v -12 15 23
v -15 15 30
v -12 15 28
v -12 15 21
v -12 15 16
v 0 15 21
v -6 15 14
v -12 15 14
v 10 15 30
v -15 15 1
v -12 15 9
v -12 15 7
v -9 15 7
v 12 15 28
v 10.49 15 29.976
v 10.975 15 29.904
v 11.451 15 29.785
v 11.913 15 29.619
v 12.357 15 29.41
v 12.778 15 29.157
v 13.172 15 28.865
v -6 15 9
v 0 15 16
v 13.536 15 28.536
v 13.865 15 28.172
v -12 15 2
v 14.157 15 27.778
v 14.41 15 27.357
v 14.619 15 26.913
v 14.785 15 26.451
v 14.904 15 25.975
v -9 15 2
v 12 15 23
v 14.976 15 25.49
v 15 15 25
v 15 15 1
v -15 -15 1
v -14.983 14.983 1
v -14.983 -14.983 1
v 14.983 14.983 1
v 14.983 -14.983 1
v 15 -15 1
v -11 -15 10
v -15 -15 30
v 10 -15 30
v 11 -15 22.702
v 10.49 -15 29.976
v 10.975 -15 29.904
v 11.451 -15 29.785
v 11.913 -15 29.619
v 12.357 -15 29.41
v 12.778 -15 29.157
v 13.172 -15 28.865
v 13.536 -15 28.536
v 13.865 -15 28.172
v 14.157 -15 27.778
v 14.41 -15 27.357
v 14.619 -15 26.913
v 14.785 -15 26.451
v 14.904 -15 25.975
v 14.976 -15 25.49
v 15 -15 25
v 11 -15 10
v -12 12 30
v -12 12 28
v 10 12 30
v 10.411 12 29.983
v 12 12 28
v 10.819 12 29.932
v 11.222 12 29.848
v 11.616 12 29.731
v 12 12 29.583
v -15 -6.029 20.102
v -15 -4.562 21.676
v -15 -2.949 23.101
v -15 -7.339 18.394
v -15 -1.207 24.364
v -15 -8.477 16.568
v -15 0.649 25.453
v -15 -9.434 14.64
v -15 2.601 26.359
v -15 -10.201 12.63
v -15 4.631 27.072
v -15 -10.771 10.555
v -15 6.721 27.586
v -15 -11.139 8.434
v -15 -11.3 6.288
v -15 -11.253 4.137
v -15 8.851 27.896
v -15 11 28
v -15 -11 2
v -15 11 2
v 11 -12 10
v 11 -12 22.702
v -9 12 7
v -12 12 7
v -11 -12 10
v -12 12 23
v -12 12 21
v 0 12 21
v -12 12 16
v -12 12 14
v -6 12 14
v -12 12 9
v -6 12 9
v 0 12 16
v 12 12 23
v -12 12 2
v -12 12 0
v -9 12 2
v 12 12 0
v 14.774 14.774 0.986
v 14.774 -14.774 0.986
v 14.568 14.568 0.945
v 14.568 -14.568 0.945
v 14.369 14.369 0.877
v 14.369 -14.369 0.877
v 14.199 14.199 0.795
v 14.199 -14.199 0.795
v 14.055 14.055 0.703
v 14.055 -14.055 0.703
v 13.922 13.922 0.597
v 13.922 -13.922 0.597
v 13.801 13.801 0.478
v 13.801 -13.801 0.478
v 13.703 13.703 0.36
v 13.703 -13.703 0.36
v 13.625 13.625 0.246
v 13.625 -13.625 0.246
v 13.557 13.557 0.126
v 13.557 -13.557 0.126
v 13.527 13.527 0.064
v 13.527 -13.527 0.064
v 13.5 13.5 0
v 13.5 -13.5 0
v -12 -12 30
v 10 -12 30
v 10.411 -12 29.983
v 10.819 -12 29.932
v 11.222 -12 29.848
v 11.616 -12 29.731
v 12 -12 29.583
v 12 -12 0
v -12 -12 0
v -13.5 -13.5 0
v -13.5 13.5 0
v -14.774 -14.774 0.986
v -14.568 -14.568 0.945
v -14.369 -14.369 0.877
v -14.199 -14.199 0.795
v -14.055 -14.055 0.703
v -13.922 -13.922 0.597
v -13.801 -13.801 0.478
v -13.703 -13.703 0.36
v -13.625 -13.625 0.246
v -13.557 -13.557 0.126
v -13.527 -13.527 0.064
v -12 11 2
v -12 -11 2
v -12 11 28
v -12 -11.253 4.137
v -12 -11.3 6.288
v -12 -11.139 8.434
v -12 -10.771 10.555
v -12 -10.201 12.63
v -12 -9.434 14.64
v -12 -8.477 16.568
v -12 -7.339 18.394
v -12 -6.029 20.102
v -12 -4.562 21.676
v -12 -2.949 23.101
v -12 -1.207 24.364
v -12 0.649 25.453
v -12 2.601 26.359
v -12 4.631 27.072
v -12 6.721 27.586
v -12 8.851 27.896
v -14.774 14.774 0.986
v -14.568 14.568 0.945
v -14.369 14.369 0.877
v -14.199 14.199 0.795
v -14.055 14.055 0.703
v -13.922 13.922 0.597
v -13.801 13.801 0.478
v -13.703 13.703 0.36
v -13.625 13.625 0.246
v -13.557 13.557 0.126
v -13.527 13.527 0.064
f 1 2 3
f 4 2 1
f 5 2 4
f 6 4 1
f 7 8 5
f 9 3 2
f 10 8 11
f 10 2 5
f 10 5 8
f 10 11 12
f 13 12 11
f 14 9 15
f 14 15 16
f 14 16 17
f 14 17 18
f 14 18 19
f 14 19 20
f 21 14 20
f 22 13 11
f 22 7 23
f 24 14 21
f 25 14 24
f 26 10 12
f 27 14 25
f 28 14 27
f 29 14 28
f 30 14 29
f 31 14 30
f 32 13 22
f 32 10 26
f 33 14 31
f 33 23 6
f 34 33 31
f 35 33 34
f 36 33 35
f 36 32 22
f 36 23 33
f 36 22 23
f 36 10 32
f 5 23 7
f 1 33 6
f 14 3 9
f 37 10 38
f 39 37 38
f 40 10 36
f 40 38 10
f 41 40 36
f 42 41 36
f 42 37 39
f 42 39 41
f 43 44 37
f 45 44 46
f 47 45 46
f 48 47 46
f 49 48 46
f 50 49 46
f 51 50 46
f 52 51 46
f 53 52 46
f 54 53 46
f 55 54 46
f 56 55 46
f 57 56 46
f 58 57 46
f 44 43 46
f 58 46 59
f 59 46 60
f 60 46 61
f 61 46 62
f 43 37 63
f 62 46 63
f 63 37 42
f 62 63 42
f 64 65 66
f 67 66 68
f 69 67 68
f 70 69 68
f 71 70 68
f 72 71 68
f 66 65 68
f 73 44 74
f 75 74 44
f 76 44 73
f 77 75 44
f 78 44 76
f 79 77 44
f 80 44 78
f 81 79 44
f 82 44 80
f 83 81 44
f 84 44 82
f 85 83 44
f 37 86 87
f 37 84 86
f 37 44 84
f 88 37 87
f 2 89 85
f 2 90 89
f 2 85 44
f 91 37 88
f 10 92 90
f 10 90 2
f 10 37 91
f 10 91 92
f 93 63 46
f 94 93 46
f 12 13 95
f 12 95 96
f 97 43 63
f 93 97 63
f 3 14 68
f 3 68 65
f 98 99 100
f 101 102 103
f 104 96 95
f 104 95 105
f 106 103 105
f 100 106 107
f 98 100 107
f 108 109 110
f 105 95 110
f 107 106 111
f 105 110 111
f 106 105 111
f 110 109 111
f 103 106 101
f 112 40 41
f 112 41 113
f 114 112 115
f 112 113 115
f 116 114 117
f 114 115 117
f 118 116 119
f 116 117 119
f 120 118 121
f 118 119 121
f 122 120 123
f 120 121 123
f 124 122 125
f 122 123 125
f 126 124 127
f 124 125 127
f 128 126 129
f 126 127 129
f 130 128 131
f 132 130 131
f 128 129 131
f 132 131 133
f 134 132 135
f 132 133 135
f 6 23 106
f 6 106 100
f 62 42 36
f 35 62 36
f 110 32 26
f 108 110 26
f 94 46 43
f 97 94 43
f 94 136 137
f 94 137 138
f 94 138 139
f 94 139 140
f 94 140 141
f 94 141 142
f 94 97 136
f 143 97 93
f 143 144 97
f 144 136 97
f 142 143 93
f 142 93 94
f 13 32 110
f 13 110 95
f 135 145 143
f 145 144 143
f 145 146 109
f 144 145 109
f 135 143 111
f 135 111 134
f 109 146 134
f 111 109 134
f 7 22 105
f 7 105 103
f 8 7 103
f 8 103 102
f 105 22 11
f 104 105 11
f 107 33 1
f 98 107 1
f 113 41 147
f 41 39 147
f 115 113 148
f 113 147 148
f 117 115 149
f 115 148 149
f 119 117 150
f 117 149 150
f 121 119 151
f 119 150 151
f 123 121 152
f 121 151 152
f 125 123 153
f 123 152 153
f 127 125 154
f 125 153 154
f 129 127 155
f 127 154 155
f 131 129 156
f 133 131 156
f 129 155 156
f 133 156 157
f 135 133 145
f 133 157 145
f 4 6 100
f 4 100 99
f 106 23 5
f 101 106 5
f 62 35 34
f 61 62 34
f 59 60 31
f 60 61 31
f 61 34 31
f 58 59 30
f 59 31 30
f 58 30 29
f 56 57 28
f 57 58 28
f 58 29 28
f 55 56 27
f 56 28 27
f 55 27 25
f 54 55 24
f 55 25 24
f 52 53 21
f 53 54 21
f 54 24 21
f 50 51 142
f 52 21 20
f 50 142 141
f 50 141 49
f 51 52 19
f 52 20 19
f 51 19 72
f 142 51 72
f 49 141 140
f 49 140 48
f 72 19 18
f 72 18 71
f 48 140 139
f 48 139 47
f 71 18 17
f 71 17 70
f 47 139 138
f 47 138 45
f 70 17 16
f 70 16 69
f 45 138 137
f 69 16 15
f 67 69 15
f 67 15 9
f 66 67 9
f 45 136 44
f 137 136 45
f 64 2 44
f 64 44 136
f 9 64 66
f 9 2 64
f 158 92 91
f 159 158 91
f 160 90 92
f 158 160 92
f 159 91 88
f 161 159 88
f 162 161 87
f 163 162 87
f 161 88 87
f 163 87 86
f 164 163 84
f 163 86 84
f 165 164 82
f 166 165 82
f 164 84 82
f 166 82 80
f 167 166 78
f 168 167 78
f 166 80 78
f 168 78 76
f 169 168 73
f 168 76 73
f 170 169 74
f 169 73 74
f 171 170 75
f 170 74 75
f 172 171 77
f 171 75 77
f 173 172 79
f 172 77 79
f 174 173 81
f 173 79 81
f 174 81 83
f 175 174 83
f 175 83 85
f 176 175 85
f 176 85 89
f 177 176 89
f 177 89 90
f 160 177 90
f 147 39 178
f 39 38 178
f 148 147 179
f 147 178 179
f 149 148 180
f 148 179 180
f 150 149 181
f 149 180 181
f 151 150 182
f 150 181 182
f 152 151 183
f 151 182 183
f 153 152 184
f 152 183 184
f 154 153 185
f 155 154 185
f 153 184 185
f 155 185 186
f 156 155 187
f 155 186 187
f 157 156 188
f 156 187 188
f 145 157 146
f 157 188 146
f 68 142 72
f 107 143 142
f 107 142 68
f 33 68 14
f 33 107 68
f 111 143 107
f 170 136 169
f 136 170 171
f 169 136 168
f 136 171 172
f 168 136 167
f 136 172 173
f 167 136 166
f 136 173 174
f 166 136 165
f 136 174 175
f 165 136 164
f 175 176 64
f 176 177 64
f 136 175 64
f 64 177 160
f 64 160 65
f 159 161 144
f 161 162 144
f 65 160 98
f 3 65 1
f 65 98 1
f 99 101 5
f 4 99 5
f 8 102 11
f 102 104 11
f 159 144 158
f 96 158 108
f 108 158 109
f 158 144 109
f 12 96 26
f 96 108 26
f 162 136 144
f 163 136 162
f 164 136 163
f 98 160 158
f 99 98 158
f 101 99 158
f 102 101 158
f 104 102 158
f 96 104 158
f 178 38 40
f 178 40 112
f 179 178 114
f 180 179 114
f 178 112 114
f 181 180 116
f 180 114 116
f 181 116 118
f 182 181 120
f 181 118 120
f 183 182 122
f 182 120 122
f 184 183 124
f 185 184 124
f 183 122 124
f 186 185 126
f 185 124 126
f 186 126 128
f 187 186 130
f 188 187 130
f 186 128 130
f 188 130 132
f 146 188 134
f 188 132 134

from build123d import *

# Parameters (mm, degrees)
F0_W          = 30
F0_H          = 30
F0_W_2        = 24
F0_H_2        = 24
F1_DEPTH      = 30
F3_DEPTH      = 5
F5_DEPTH      = 4
F6_W          = 12
F6_H          = 5
F6_W_2        = 6
F6_W_3        = 3
F6_W_4        = 24
F7_DEPTH      = 3
F8_W          = 30.8
F8_H          = 30.8
F8_W_2        = 27
F8_H_2        = 27
F9_DEPTH      = 1
F10_T1_DEPTH  = 27
F10_T3_DEPTH  = 27
F10_T9_DEPTH  = 30.7080992435
F10_T14_DEPTH = 30.7080992435
F10_T22_DEPTH = 30.7080992435
F10_T27_DEPTH = 30.7080992435
F10_T35_DEPTH = 30.7080992435
F10_T40_DEPTH = 30.7080992435
F10_T48_DEPTH = 30.7080992435
F10_T53_DEPTH = 30.7080992435
F11_T1_DEPTH  = 55


# Not quite as in the source:
# - a fillet or chamfer that OpenCascade refuses, or shapes differently, is made with other operations: its cross-section is extruded or revolved along the edge and cut away or added


with BuildPart() as f1:
    # F0 (on Top) → F1 (new body)
    with BuildSketch(Plane.XY):
        Rectangle(F0_W, F0_H)
        Rectangle(F0_W_2, F0_H_2, mode=Mode.SUBTRACT)
    extrude(amount=F1_DEPTH)

    # F2 (on face) → F3 (cut)
    with BuildSketch(Plane.XZ.offset(15)):
        Polygon((11, 22.7017059222), (-11, 10), (11, 10), align=None)
    extrude(amount=-F3_DEPTH, mode=Mode.SUBTRACT)

    # F4 (on face) → F5 (cut)
    with BuildSketch(Plane(origin=(-15, 0, 0), x_dir=(0, -1, 0), z_dir=(-1, 0, 0))):
        with BuildLine():
            ThreePointArc((11, 2), (6.0293863659, 20.1017884635), (-11, 28))
            Line((-11, 28), (-11, 2))
            Line((-11, 2), (11, 2))
        make_face()
    extrude(amount=-F5_DEPTH, mode=Mode.SUBTRACT)

    # F6 (on face) → F7 (cut)
    with BuildSketch(Plane(origin=(0, 15, 0), x_dir=(-1, 0, 0), z_dir=(0, 1, 0))):
        with Locations((6, 18.5)):
            Rectangle(F6_W, F6_H)
        with Locations((9, 11.5)):
            Rectangle(F6_W_2, F6_H)
        with Locations((10.5, 4.5)):
            Rectangle(F6_W_3, F6_H)
        with Locations((0, 25.5)):
            Rectangle(F6_W_4, F6_H)
    extrude(amount=-F7_DEPTH, mode=Mode.SUBTRACT)

    # F8 (on face) → F9 (cut)
    with BuildSketch(Plane(origin=(0, 0, 0), x_dir=(1, 0, 0), z_dir=(0, 0, -1))):
        Rectangle(F8_W, F8_H)
        Rectangle(F8_W_2, F8_H_2, mode=Mode.SUBTRACT)
    extrude(amount=-F9_DEPTH, mode=Mode.SUBTRACT)

    # F10: fillet of radius 1.6 on 4 edges, made by hand

    # F10_s2 → F10_t1 (join)
    with BuildSketch(Plane.XZ.offset(-13.5)):
        with BuildLine():
            ThreePointArc((-14.9832396974, 1), (-14.0888125064, 0.7266499161), (-13.5, 0))
            Line((-13.5, 0), (-13.5, 1))
            Line((-13.5, 1), (-14.9832396974, 1))
        make_face()
        with BuildLine():
            ThreePointArc((14.9832396974, 1), (14.0888125064, 0.7266499161), (13.5, 0))
            Line((13.5, 0), (13.5, 1))
            Line((13.5, 1), (14.9832396974, 1))
        make_face()
    extrude(amount=F10_T1_DEPTH)

    # F10_s4 → F10_t3 (join)
    with BuildSketch(Plane.YZ.offset(-13.5)):
        with BuildLine():
            ThreePointArc((14.9832396974, 1), (14.0888125064, 0.7266499161), (13.5, 0))
            Line((13.5, 0), (13.5, 1))
            Line((13.5, 1), (14.9832396974, 1))
        make_face()
        with BuildLine():
            ThreePointArc((-14.9832396974, 1), (-14.0888125064, 0.7266499161), (-13.5, 0))
            Line((-13.5, 0), (-13.5, 1))
            Line((-13.5, 1), (-14.9832396974, 1))
        make_face()
    extrude(amount=F10_T3_DEPTH)


with BuildPart() as f10_tool7:
    # F10_s8 → F10_t9 (new body)
    with BuildSketch(Plane.XZ.offset(-17.2080992435)):
        with BuildLine():
            ThreePointArc((-14.9832396974, 1), (-14.0888125064, 0.7266499161), (-13.5, 0))
            Line((-13.5, 0), (-13.5, 1))
            Line((-13.5, 1), (-14.9832396974, 1))
        make_face()
    extrude(amount=F10_T9_DEPTH)

    split(bisect_by=Plane.XZ.offset(-15), keep=Keep.TOP)

    split(bisect_by=Plane.XZ.offset(-13.5), keep=Keep.BOTTOM)


with BuildPart() as f10_tool12:
    # F10_s13 → F10_t14 (new body)
    with BuildSketch(Plane.YZ.offset(13.5)):
        with BuildLine():
            ThreePointArc((14.9832396974, 1), (14.0888125064, 0.7266499161), (13.5, 0))
            Line((13.5, 0), (13.5, 1))
            Line((13.5, 1), (14.9832396974, 1))
        make_face()
    extrude(amount=-F10_T14_DEPTH)

    split(bisect_by=Plane.YZ.offset(-15), keep=Keep.TOP)

    split(bisect_by=Plane.YZ.offset(-13.5), keep=Keep.BOTTOM)


with BuildPart() as f10_tool7_1:
    add(f10_tool7.part)

    # F10_t17: intersect F10_tool12
    add(f10_tool12.part, mode=Mode.INTERSECT)


with BuildPart() as f1_1:
    add(f1.part)

    # F10_t5: union F10_tool7
    add(f10_tool7_1.part)


with BuildPart() as f10_tool20:
    # F10_s21 → F10_t22 (new body)
    with BuildSketch(Plane.XZ.offset(-13.5)):
        with BuildLine():
            ThreePointArc((-14.9832396974, 1), (-14.0888125064, 0.7266499161), (-13.5, 0))
            Line((-13.5, 0), (-13.5, 1))
            Line((-13.5, 1), (-14.9832396974, 1))
        make_face()
    extrude(amount=F10_T22_DEPTH)

    split(bisect_by=Plane.XZ.offset(15), keep=Keep.BOTTOM)

    split(bisect_by=Plane.XZ.offset(13.5), keep=Keep.TOP)


with BuildPart() as f10_tool25:
    # F10_s26 → F10_t27 (new body)
    with BuildSketch(Plane.YZ.offset(-17.2080992435)):
        with BuildLine():
            ThreePointArc((-14.9832396974, 1), (-14.0888125064, 0.7266499161), (-13.5, 0))
            Line((-13.5, 0), (-13.5, 1))
            Line((-13.5, 1), (-14.9832396974, 1))
        make_face()
    extrude(amount=F10_T27_DEPTH)

    split(bisect_by=Plane.YZ.offset(-15), keep=Keep.TOP)

    split(bisect_by=Plane.YZ.offset(-13.5), keep=Keep.BOTTOM)


with BuildPart() as f10_tool20_1:
    add(f10_tool20.part)

    # F10_t30: intersect F10_tool25
    add(f10_tool25.part, mode=Mode.INTERSECT)


with BuildPart() as f1_2:
    add(f1_1.part)

    # F10_t18: union F10_tool20
    add(f10_tool20_1.part)


with BuildPart() as f10_tool33:
    # F10_s34 → F10_t35 (new body)
    with BuildSketch(Plane.YZ.offset(17.2080992435)):
        with BuildLine():
            ThreePointArc((14.9832396974, 1), (14.0888125064, 0.7266499161), (13.5, 0))
            Line((13.5, 0), (13.5, 1))
            Line((13.5, 1), (14.9832396974, 1))
        make_face()
    extrude(amount=-F10_T35_DEPTH)

    split(bisect_by=Plane.YZ.offset(15), keep=Keep.BOTTOM)

    split(bisect_by=Plane.YZ.offset(13.5), keep=Keep.TOP)


with BuildPart() as f10_tool38:
    # F10_s39 → F10_t40 (new body)
    with BuildSketch(Plane.XZ.offset(13.5)):
        with BuildLine():
            ThreePointArc((14.9832396974, 1), (14.0888125064, 0.7266499161), (13.5, 0))
            Line((13.5, 0), (13.5, 1))
            Line((13.5, 1), (14.9832396974, 1))
        make_face()
    extrude(amount=-F10_T40_DEPTH)

    split(bisect_by=Plane.XZ.offset(-15), keep=Keep.TOP)

    split(bisect_by=Plane.XZ.offset(-13.5), keep=Keep.BOTTOM)


with BuildPart() as f10_tool33_1:
    add(f10_tool33.part)

    # F10_t43: intersect F10_tool38
    add(f10_tool38.part, mode=Mode.INTERSECT)


with BuildPart() as f1_3:
    add(f1_2.part)

    # F10_t31: union F10_tool33
    add(f10_tool33_1.part)


with BuildPart() as f10_tool46:
    # F10_s47 → F10_t48 (new body)
    with BuildSketch(Plane.YZ.offset(-13.5)):
        with BuildLine():
            ThreePointArc((-14.9832396974, 1), (-14.0888125064, 0.7266499161), (-13.5, 0))
            Line((-13.5, 0), (-13.5, 1))
            Line((-13.5, 1), (-14.9832396974, 1))
        make_face()
    extrude(amount=F10_T48_DEPTH)

    split(bisect_by=Plane.YZ.offset(15), keep=Keep.BOTTOM)

    split(bisect_by=Plane.YZ.offset(13.5), keep=Keep.TOP)


with BuildPart() as f10_tool51:
    # F10_s52 → F10_t53 (new body)
    with BuildSketch(Plane.XZ.offset(17.2080992435)):
        with BuildLine():
            ThreePointArc((14.9832396974, 1), (14.0888125064, 0.7266499161), (13.5, 0))
            Line((13.5, 0), (13.5, 1))
            Line((13.5, 1), (14.9832396974, 1))
        make_face()
    extrude(amount=-F10_T53_DEPTH)

    split(bisect_by=Plane.XZ.offset(15), keep=Keep.BOTTOM)

    split(bisect_by=Plane.XZ.offset(13.5), keep=Keep.TOP)


with BuildPart() as f10_tool46_1:
    add(f10_tool46.part)

    # F10_t56: intersect F10_tool51
    add(f10_tool51.part, mode=Mode.INTERSECT)


with BuildPart() as f1_4:
    add(f1_3.part)

    # F10_t44: union F10_tool46
    add(f10_tool46_1.part)

    # F11: fillet of radius 5 on 1 edges, made by hand

    # F11_s2 → F11_t1 (cut)
    with BuildSketch(Plane.XZ.offset(-27.5)):
        with BuildLine():
            ThreePointArc((15, 25), (13.5355339059, 28.5355339059), (10, 30))
            Line((10, 30), (15, 30))
            Line((15, 30), (15, 25))
        make_face()
    extrude(amount=F11_T1_DEPTH, mode=Mode.SUBTRACT)


solid = f1_4.part
